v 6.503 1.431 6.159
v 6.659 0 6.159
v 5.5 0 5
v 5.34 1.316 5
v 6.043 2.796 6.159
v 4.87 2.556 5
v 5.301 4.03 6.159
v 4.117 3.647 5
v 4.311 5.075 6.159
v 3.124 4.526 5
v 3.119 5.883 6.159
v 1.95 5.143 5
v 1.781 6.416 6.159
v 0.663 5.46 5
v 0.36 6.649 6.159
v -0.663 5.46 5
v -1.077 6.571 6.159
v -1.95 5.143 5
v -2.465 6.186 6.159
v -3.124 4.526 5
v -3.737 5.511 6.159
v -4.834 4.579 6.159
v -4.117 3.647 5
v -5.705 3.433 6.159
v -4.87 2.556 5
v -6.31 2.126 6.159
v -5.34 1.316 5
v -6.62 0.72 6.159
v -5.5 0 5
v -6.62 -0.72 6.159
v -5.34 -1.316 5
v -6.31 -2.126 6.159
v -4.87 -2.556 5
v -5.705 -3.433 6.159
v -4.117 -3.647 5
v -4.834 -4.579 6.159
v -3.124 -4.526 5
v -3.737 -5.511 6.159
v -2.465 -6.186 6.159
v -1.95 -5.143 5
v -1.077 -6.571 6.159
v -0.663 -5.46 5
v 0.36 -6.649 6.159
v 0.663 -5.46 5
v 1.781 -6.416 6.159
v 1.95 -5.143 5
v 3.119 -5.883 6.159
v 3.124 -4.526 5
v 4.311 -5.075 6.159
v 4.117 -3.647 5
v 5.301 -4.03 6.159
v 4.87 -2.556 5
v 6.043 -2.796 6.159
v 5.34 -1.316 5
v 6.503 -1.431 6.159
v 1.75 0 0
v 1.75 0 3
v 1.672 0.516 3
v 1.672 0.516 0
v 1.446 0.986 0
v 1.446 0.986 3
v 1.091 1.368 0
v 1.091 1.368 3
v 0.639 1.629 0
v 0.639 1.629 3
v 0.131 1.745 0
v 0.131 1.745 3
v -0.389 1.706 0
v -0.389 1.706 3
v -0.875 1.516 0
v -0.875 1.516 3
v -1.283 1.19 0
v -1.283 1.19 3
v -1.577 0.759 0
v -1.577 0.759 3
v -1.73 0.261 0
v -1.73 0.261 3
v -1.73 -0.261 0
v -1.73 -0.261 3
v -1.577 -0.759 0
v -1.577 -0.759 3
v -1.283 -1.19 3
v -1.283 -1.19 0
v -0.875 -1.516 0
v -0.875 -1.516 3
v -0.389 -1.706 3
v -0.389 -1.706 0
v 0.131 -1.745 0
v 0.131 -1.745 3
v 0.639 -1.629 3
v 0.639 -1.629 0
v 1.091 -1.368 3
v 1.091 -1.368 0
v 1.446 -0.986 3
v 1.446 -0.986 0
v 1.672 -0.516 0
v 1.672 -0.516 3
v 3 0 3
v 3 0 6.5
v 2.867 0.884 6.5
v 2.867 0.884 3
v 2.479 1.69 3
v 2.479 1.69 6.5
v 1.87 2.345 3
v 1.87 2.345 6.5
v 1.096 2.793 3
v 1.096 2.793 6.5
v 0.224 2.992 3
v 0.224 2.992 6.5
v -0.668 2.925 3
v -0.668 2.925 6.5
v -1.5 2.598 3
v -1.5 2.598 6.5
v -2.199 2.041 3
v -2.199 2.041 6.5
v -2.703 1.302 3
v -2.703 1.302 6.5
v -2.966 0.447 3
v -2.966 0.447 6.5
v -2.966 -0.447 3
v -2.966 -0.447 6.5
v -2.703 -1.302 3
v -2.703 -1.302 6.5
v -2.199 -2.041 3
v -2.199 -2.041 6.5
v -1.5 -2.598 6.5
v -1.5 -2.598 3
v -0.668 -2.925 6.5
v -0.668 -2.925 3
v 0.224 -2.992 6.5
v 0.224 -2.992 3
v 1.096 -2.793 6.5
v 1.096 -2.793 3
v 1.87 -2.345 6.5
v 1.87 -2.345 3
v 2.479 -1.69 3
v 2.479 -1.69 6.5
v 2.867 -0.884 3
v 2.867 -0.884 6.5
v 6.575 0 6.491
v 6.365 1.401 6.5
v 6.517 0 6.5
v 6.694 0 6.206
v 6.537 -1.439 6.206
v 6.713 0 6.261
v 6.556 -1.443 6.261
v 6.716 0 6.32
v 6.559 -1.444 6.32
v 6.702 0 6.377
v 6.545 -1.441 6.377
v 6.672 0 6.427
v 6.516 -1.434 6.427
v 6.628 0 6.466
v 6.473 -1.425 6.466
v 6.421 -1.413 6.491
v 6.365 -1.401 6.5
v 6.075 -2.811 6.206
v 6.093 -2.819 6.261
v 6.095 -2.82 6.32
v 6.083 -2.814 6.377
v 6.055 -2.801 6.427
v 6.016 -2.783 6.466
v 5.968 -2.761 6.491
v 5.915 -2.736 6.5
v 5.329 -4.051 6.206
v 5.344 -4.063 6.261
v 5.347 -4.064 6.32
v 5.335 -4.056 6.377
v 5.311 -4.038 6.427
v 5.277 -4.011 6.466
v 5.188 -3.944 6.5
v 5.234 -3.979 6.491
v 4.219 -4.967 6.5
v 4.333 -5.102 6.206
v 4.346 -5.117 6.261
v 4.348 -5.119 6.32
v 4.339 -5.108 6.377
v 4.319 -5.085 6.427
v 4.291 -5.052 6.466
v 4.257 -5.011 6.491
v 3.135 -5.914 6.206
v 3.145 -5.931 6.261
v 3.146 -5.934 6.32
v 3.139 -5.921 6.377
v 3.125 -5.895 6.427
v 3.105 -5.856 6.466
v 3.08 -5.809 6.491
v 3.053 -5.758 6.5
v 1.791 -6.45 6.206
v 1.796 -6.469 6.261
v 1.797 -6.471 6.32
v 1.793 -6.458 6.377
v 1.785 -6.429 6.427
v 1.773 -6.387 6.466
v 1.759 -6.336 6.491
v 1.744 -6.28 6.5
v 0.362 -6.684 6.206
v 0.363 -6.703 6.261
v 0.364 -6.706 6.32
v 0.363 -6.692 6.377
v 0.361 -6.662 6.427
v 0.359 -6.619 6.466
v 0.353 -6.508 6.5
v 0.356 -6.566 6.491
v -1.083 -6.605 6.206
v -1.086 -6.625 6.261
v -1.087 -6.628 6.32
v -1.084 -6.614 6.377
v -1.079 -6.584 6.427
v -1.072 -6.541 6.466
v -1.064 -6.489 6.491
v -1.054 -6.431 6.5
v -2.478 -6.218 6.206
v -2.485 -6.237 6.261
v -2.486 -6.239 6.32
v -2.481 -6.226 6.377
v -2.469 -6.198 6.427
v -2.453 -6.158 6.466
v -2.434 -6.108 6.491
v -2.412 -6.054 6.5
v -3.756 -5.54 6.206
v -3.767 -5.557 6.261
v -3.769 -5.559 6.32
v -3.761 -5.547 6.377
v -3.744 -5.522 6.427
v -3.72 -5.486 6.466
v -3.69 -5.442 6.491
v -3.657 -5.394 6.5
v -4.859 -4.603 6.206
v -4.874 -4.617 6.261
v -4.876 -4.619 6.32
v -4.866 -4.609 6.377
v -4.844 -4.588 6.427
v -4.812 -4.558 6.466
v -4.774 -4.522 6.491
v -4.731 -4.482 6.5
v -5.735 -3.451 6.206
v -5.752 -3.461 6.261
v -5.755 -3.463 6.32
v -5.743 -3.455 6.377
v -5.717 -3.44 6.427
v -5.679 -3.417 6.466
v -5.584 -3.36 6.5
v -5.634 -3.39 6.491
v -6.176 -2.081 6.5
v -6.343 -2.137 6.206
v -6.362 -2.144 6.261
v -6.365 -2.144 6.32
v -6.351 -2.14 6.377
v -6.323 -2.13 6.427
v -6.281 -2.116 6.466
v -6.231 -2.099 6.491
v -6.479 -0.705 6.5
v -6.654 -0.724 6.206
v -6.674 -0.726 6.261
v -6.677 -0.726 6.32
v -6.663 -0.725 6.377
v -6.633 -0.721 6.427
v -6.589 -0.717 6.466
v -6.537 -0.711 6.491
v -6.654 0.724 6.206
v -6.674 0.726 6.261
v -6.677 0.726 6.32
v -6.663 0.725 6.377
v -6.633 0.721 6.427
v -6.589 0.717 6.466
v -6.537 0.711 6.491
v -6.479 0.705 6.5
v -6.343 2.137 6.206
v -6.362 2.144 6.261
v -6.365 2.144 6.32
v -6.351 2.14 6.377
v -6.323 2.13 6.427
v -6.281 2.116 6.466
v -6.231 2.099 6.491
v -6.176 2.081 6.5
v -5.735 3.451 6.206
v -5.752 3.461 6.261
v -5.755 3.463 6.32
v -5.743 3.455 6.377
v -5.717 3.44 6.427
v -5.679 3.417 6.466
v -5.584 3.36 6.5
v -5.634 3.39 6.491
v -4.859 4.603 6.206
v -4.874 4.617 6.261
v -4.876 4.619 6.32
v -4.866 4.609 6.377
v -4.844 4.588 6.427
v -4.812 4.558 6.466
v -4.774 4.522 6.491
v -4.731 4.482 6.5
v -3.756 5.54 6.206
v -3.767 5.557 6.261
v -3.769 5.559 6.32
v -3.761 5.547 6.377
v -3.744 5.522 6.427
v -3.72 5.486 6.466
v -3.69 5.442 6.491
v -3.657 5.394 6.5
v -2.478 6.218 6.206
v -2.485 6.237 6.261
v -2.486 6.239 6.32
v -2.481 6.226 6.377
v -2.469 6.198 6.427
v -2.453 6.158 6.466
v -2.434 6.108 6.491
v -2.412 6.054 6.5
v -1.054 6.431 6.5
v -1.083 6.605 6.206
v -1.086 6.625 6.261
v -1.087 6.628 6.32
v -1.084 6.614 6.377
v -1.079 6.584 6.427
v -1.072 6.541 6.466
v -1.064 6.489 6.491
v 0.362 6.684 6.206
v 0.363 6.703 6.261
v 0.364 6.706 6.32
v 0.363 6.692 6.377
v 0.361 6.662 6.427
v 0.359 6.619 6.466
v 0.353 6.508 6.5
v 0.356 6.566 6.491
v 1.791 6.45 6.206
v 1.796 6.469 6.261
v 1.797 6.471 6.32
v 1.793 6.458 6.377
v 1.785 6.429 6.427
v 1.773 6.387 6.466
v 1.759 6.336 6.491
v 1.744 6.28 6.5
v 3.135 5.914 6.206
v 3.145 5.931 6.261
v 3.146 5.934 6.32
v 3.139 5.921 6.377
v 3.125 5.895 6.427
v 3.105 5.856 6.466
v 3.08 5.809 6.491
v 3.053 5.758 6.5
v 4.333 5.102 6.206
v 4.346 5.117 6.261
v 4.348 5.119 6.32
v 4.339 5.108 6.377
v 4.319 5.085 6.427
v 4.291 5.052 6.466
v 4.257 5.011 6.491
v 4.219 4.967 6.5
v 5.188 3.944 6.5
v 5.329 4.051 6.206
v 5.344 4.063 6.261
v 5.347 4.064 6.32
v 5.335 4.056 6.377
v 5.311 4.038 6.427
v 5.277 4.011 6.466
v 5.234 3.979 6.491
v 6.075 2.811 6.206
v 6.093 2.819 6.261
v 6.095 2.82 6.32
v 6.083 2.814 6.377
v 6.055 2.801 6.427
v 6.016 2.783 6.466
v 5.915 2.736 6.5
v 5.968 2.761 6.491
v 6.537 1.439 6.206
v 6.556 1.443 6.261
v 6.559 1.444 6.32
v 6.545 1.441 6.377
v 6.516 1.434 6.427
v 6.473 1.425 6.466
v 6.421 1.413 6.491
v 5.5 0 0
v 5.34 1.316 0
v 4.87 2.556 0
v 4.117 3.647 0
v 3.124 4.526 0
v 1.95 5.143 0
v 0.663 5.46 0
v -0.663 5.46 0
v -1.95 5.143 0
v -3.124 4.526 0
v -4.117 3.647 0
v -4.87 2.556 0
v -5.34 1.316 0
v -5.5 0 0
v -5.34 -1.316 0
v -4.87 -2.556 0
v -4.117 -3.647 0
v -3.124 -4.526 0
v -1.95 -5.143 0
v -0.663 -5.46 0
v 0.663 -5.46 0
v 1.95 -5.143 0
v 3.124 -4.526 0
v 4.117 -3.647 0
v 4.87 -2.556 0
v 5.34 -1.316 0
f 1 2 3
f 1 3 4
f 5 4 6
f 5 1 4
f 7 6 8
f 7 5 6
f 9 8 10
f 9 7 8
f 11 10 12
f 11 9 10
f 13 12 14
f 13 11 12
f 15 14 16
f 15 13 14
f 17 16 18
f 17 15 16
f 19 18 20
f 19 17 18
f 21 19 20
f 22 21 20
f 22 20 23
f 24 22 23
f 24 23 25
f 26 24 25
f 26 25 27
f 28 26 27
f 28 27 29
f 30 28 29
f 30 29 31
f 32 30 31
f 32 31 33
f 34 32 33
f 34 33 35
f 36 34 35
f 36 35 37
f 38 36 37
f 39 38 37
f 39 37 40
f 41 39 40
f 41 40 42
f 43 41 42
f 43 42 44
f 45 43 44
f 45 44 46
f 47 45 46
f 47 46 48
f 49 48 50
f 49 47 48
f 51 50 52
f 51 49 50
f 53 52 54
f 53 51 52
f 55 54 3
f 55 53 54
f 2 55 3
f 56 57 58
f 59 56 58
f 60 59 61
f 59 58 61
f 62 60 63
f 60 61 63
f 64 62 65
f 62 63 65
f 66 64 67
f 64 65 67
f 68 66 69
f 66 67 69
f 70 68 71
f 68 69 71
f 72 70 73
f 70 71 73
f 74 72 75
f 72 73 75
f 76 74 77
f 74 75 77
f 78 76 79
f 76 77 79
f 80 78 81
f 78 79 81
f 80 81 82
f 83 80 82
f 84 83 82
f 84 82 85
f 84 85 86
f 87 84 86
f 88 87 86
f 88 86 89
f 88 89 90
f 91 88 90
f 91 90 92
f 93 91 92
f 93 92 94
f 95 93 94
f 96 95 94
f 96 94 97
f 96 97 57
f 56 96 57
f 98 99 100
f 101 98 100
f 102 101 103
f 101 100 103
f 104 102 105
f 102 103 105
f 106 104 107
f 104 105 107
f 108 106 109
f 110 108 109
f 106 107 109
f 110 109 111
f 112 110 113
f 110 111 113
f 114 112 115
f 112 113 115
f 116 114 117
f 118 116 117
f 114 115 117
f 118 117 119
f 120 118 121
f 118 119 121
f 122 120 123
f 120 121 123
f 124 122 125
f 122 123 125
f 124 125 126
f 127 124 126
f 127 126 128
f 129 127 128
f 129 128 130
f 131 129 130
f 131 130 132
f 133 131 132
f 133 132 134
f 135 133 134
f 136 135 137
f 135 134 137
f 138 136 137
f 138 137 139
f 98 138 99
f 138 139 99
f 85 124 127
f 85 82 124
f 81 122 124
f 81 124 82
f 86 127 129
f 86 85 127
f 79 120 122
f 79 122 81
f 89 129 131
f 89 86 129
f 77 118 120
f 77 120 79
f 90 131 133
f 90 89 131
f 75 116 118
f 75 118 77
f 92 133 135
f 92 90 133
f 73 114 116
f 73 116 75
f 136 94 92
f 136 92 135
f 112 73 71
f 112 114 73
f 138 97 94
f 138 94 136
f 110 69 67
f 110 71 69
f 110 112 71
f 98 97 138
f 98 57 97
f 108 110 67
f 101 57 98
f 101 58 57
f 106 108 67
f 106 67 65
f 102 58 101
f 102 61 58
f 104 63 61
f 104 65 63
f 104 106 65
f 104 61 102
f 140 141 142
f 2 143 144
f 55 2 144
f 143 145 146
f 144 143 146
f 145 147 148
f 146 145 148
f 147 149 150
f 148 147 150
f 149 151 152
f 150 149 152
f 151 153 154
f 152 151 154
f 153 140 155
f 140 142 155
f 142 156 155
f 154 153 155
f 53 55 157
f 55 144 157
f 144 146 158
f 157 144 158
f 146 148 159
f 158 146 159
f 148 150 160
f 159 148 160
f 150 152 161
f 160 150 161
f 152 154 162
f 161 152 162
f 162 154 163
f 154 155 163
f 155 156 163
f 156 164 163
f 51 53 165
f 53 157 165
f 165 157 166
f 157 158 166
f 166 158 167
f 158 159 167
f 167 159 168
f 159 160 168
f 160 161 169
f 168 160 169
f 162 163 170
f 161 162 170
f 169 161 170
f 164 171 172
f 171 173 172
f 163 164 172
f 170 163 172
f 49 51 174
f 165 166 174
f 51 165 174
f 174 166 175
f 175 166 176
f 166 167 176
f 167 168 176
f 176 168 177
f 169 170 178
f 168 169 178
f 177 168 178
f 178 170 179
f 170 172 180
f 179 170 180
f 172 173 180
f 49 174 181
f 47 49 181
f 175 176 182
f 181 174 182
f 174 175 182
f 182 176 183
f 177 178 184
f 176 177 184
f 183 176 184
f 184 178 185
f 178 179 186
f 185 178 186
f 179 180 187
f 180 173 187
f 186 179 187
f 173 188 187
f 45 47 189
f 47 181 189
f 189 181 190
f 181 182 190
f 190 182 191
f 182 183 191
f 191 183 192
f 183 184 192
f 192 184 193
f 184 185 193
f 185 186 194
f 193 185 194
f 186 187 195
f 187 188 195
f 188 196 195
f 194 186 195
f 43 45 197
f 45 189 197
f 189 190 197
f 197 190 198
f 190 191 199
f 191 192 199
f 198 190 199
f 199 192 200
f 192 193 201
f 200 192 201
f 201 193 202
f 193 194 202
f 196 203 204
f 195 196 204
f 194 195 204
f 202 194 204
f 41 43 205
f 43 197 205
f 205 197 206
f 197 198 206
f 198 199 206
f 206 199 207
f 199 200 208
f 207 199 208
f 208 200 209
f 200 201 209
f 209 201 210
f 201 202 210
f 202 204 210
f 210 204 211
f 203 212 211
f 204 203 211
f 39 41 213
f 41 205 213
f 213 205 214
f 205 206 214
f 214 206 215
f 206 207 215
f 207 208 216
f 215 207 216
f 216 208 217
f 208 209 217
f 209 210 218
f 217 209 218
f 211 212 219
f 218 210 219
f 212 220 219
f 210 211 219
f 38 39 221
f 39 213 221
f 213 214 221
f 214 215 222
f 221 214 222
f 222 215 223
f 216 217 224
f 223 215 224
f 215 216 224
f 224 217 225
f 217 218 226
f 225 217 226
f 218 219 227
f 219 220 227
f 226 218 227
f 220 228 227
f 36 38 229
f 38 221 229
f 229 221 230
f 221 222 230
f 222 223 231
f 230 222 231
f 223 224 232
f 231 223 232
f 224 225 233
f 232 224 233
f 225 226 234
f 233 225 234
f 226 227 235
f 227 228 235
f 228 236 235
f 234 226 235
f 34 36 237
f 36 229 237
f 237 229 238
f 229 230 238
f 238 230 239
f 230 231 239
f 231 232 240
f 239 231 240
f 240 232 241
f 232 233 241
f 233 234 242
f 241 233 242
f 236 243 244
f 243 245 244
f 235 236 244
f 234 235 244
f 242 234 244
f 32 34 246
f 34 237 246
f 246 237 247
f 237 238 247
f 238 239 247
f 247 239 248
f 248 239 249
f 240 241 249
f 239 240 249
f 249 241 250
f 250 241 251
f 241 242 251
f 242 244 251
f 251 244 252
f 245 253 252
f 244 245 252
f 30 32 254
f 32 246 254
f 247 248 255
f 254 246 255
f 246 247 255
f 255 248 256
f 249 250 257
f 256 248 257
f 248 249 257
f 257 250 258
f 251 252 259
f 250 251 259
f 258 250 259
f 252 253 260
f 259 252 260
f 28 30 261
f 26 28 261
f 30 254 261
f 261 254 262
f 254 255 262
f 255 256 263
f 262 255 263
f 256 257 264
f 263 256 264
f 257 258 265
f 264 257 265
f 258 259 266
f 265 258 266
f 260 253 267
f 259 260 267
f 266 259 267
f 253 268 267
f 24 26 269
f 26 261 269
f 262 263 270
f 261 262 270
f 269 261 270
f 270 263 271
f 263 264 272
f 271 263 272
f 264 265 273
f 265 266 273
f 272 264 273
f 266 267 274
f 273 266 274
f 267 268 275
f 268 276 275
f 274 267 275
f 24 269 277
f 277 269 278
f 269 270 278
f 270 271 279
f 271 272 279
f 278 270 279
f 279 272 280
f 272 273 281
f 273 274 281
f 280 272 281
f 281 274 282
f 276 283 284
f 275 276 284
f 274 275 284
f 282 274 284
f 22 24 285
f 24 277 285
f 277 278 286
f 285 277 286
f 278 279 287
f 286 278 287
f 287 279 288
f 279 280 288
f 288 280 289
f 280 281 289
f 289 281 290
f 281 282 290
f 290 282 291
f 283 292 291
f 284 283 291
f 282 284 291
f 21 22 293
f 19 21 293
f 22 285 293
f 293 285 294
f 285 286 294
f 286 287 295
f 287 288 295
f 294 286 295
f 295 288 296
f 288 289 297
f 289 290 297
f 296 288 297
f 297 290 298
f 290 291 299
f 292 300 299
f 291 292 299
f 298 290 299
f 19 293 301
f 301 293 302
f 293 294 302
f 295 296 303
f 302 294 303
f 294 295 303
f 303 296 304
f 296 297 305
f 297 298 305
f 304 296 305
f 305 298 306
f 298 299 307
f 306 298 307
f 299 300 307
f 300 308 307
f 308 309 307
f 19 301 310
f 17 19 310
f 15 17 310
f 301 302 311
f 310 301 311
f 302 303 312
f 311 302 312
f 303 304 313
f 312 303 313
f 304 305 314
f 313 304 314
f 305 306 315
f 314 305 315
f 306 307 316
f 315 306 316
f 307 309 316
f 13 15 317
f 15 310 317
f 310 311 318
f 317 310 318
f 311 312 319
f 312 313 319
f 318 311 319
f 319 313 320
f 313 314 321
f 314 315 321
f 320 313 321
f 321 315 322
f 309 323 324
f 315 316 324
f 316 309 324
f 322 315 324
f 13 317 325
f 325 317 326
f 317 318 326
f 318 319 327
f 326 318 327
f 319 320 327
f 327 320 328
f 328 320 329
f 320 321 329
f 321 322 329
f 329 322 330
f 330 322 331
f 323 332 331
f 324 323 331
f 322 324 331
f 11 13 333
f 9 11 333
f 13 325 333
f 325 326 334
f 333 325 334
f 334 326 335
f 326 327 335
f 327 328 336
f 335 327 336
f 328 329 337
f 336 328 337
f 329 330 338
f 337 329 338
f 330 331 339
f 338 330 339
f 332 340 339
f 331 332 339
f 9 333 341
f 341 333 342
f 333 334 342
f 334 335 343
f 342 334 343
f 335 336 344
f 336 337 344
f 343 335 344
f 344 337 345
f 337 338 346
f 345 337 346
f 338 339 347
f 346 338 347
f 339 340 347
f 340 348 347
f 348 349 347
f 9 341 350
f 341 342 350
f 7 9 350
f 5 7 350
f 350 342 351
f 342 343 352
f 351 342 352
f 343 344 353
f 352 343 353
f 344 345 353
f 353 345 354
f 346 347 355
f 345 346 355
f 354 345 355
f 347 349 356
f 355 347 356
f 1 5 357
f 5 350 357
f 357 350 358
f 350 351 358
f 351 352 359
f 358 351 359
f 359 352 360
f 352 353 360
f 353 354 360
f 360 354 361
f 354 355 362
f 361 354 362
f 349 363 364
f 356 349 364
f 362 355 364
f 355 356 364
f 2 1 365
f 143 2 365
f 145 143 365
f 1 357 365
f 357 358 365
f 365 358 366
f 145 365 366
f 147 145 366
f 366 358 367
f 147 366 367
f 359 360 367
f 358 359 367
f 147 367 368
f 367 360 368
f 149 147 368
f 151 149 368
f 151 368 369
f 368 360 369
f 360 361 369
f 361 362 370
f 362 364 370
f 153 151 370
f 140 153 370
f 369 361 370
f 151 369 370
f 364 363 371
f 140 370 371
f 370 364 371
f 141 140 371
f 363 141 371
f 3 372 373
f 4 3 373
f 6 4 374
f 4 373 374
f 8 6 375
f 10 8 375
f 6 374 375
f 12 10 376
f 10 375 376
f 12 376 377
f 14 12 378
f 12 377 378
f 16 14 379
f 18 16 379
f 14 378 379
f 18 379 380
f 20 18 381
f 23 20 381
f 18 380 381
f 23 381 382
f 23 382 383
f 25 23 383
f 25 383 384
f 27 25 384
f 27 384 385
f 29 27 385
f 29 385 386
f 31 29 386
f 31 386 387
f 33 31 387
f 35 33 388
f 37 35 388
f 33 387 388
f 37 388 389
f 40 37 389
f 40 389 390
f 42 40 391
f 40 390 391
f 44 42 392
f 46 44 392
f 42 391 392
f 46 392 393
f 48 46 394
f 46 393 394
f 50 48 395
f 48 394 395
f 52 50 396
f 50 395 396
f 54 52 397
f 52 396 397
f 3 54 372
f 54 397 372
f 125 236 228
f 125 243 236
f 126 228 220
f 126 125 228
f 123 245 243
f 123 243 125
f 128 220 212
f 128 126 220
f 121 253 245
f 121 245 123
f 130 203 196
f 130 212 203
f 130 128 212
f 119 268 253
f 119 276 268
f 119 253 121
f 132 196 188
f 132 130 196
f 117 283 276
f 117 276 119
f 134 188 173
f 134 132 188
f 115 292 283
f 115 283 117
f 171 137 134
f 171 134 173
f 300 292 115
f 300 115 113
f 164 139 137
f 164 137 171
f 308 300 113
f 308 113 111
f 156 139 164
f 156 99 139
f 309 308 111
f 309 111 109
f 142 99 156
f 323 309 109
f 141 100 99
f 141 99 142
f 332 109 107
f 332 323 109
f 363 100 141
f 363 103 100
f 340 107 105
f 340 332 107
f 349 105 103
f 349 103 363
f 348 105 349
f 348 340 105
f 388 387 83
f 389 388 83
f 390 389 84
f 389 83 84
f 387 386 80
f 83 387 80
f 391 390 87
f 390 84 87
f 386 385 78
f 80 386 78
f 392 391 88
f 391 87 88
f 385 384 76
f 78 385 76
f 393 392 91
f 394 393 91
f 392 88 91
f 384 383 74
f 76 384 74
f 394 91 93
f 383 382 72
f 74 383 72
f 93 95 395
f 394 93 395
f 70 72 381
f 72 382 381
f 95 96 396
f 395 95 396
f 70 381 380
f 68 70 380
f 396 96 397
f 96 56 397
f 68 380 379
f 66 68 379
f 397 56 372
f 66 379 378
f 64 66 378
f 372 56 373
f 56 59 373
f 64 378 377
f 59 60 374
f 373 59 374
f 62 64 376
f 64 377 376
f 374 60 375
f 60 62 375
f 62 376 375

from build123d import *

# Parameters (mm, degrees)
F0_R      = 5.5
F1_DEPTH  = 5
F1_FACE_R = 5.5
F2_DEPTH  = 1.5
F2_TAPER  = -45
F3_R      = 0.2
F4_R      = 1.75
F5_DEPTH  = 6.501
F4_R_2    = 3
F6_DEPTH  = 3.5


with BuildPart() as f1:
    # F0 (on Top) → F1 (new body)
    with BuildSketch(Plane.XY):
        Circle(F0_R)
    extrude(amount=F1_DEPTH)

    # F1_face (on face) → F2 (join)
    with BuildSketch(Plane.XY.offset(5)):
        Circle(F1_FACE_R)
    extrude(amount=F2_DEPTH, taper=F2_TAPER)

    # F3
    f3_edges = [f1.edges().sort_by_distance(p)[0] for p in [
        (-7, 0, 6.5),
    ]]
    fillet(f3_edges, radius=F3_R)

    # F4 (on face) → F5 (cut, through all)
    with BuildSketch(Plane.XY.offset(6.5)):
        Circle(F4_R)
    extrude(amount=-F5_DEPTH, mode=Mode.SUBTRACT)

    # F4 (on face) → F6 (cut)
    with BuildSketch(Plane.XY.offset(6.5)):
        Circle(F4_R_2)
        Circle(F4_R, mode=Mode.SUBTRACT)
    extrude(amount=-F6_DEPTH, mode=Mode.SUBTRACT)


solid = f1.part
